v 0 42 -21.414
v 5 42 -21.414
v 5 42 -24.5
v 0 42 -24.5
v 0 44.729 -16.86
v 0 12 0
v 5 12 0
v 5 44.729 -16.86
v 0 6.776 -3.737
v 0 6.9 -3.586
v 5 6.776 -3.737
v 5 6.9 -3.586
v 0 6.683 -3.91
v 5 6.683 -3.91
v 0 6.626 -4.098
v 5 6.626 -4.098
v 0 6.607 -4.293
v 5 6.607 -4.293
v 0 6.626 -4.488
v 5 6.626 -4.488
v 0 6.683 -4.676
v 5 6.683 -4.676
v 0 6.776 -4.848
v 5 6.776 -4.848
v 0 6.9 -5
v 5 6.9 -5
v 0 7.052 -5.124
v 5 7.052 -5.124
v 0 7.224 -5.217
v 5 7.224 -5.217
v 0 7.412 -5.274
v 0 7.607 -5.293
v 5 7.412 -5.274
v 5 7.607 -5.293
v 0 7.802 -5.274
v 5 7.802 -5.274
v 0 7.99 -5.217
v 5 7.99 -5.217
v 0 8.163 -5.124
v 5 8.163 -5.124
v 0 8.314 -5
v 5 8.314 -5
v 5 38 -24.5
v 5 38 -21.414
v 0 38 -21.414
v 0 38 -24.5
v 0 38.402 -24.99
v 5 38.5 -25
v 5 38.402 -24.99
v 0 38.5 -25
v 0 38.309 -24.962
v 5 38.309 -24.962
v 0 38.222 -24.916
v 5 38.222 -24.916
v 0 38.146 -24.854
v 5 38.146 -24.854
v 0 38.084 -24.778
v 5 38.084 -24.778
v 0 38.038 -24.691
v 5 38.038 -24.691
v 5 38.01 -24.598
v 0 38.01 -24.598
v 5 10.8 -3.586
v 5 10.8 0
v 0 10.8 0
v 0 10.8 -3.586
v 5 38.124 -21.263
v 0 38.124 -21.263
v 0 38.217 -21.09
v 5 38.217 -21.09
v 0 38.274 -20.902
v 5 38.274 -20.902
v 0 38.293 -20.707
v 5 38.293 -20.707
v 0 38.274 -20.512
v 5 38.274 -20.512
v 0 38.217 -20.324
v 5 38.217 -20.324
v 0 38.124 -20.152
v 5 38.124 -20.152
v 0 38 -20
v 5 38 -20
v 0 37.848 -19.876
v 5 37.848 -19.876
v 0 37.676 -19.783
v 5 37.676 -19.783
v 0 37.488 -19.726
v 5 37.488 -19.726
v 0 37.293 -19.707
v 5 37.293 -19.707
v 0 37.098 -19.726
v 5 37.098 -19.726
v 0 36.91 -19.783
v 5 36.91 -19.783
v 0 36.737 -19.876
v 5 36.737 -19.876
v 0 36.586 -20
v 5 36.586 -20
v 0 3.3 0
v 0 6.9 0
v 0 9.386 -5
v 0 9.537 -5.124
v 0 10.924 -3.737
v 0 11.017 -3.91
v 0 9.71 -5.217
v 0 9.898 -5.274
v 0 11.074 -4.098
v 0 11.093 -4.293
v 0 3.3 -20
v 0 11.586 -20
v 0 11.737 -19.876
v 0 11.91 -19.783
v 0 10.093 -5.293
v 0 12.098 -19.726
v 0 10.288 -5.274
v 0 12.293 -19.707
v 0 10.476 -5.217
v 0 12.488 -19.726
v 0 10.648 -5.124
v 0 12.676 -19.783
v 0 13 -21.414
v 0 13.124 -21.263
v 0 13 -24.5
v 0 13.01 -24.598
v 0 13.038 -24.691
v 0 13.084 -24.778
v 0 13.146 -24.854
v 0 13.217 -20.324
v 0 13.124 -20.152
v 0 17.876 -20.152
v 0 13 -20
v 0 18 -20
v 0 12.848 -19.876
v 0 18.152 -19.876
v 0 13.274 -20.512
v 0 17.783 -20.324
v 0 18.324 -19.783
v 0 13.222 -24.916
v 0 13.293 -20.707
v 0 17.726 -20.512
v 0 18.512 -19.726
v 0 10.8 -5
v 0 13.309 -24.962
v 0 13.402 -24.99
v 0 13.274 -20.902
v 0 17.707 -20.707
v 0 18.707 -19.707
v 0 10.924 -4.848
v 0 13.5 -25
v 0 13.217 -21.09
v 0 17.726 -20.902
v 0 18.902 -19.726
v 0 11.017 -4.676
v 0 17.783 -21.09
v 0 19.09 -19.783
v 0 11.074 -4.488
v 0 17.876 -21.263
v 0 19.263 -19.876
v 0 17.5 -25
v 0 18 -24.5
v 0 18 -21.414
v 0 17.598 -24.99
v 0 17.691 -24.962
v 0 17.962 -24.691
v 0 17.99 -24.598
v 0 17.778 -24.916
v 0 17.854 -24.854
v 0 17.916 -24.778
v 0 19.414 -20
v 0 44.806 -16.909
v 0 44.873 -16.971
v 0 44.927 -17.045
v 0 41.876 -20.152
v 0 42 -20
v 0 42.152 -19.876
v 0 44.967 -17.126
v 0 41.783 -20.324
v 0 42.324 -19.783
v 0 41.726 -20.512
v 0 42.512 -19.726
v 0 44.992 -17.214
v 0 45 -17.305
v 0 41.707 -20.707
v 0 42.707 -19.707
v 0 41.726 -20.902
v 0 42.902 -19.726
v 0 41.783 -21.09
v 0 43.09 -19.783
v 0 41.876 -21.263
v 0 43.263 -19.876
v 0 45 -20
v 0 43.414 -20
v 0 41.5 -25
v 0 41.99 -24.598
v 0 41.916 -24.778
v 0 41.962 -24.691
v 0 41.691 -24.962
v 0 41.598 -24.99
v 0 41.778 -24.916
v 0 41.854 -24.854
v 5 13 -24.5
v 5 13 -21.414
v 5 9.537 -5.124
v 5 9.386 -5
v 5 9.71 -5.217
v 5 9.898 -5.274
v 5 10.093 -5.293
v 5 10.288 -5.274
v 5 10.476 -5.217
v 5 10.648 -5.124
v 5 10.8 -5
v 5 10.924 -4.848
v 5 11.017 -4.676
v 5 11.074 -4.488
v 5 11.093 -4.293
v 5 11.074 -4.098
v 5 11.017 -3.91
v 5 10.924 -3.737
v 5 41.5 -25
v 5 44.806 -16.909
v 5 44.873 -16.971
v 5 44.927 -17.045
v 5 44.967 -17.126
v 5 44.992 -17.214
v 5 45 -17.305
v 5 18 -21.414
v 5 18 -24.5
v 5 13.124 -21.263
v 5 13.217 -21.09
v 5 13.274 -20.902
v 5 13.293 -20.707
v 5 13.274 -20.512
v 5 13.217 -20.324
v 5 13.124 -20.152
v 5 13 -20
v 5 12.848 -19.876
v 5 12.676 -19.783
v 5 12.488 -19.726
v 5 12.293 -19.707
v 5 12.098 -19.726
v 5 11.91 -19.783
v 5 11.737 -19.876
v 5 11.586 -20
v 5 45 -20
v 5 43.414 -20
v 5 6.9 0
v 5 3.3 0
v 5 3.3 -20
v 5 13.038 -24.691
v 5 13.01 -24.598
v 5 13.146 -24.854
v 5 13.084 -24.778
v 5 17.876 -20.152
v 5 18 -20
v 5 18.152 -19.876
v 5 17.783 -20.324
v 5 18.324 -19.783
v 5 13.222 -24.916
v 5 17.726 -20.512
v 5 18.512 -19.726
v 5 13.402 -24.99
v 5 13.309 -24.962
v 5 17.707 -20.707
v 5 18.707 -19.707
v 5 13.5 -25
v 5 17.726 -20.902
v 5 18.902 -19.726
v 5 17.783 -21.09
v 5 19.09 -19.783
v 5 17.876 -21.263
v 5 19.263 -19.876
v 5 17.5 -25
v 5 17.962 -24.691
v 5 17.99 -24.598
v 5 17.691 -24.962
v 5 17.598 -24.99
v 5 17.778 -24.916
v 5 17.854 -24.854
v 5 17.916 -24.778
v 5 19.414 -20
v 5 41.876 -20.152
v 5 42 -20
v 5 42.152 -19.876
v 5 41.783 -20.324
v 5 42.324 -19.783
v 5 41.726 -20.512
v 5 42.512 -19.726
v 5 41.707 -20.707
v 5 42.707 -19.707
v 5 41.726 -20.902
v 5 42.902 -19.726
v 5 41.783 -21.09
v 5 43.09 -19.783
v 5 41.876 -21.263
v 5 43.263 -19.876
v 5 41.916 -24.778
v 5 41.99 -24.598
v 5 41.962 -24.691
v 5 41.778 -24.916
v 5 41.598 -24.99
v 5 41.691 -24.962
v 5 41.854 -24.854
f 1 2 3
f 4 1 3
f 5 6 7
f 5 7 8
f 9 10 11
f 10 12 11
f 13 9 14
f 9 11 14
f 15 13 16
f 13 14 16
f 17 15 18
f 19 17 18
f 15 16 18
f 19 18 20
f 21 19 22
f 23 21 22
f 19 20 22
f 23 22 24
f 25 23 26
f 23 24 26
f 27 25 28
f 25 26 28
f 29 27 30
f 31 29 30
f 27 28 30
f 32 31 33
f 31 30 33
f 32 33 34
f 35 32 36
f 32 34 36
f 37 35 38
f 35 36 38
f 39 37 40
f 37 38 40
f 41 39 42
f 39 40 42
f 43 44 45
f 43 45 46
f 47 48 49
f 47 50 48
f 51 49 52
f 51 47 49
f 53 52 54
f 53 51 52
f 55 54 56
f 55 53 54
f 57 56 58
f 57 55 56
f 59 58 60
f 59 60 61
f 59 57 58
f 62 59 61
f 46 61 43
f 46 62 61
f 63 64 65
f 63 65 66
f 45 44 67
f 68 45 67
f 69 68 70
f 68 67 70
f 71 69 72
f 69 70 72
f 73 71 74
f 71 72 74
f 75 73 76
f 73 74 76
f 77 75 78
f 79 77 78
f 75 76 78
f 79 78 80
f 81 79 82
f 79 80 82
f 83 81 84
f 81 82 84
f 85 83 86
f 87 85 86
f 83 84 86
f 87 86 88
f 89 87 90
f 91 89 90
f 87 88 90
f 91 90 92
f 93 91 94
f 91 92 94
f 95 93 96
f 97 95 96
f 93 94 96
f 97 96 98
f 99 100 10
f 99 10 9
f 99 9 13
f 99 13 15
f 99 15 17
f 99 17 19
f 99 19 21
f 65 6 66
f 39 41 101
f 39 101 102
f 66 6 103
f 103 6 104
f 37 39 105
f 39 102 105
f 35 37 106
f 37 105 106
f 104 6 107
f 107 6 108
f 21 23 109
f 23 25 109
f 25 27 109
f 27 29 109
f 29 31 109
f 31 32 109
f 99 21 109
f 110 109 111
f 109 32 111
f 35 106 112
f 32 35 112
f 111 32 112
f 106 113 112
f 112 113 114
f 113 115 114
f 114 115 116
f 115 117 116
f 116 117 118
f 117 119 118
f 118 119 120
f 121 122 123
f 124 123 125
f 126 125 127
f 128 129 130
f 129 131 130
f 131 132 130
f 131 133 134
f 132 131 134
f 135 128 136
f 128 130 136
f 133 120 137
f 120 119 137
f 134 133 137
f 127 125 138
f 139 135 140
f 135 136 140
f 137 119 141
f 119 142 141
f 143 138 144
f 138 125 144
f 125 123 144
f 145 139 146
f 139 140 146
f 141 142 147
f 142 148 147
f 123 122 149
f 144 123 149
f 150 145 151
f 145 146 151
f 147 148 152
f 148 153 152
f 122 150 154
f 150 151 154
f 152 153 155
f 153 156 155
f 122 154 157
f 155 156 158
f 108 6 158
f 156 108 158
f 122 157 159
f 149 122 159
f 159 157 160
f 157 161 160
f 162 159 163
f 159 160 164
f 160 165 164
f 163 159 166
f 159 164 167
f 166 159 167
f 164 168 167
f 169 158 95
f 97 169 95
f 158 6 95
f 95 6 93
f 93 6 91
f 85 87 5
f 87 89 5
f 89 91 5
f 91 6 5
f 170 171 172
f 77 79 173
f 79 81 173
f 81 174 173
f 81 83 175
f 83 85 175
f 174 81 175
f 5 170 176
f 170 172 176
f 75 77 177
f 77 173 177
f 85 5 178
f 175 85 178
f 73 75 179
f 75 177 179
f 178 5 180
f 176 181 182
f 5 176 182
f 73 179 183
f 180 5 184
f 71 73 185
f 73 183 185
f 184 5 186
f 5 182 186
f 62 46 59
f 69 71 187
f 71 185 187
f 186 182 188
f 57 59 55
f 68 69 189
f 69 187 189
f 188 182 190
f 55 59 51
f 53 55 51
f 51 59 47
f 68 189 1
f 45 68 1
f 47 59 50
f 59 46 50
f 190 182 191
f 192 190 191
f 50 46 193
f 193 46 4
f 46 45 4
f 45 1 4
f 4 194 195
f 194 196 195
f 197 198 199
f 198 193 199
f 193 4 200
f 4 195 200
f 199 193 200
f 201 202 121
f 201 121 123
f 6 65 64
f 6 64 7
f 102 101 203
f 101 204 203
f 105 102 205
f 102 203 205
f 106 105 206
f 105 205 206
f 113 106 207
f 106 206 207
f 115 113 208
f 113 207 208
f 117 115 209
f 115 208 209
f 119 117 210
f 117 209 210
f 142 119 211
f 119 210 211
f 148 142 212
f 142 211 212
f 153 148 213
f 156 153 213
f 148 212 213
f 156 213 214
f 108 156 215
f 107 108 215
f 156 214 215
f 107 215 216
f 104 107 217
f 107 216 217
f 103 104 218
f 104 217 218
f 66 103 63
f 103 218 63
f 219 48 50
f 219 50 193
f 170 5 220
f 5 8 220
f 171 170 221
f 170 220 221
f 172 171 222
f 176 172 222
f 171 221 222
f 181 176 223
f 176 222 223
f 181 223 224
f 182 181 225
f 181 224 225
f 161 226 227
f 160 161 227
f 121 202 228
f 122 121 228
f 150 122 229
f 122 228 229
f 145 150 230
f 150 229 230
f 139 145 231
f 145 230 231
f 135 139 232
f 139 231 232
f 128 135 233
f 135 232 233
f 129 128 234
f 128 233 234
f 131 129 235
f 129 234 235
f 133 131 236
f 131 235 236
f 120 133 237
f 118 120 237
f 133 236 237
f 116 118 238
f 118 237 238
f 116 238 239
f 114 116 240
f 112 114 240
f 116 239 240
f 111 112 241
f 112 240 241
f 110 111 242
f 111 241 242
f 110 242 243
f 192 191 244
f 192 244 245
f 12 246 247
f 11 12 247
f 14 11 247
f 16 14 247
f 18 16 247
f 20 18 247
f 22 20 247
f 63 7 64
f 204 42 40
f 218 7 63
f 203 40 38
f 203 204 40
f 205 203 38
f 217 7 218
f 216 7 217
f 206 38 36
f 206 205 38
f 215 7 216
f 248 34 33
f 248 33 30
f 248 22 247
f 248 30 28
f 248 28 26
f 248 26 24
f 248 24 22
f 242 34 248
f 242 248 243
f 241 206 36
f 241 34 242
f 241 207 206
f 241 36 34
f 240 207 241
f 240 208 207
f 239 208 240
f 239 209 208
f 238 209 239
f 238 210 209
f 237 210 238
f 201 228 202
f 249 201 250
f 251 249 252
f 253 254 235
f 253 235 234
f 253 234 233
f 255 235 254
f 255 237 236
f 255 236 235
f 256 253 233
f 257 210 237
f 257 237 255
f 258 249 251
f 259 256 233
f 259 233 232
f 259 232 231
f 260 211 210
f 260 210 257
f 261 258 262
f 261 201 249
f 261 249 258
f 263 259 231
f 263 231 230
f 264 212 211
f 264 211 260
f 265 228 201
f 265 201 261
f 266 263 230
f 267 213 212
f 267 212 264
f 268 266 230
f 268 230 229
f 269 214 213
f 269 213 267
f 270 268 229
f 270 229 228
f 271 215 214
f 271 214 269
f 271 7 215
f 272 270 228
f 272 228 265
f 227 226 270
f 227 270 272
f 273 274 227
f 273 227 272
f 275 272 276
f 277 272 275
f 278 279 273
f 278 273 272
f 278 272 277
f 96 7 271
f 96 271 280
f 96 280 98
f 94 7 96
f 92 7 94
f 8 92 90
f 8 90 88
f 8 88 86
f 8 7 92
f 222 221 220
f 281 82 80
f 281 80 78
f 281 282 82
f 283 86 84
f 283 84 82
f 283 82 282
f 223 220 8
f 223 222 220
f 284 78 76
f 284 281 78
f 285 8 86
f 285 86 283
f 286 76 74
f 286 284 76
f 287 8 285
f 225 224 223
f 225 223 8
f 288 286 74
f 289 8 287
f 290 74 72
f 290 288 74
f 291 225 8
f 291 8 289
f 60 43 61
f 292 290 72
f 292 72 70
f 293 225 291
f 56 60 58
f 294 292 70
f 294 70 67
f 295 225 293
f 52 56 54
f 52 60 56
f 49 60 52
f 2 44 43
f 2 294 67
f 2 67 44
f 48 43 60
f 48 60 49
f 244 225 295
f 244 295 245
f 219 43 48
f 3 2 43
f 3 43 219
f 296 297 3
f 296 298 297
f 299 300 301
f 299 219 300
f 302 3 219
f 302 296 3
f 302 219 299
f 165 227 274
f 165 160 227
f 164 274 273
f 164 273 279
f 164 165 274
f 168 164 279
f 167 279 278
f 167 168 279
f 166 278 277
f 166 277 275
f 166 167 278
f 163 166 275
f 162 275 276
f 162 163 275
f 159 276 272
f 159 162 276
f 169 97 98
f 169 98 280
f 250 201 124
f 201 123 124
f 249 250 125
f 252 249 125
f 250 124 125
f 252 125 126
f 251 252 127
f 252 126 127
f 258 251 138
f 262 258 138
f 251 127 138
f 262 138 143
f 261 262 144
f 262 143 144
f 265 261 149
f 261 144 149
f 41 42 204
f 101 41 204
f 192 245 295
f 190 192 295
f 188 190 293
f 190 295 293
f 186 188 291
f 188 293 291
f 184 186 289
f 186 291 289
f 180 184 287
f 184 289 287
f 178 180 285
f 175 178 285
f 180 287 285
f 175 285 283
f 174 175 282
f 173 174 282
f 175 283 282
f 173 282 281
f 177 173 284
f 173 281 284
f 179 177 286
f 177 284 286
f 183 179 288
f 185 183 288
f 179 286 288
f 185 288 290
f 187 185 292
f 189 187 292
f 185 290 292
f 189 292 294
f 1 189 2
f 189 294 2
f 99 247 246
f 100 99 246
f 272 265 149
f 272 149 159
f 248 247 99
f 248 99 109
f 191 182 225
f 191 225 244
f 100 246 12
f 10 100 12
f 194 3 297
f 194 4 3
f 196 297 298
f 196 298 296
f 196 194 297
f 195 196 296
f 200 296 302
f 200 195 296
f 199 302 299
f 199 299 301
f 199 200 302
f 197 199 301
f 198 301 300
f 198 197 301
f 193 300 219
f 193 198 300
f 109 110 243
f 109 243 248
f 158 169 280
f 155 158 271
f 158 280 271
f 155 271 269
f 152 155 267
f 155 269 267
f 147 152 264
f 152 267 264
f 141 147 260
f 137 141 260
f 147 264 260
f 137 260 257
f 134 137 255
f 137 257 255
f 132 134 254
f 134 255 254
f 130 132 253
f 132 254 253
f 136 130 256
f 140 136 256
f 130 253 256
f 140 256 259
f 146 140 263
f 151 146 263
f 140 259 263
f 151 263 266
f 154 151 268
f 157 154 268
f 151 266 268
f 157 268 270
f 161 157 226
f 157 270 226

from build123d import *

# Parameters (mm, degrees)
EXTRUDE_1_DEPTH     = 5
SKETCH_7_W          = 5
SKETCH_7_H          = 10.8
CUT_EXTRUDE_1_DEPTH = 5
SKETCH_8_W          = 15
SKETCH_8_H          = 3.3
CUT_EXTRUDE_2_DEPTH = 5
SKETCH_10_W         = 5
SKETCH_10_H         = 3.6
EXTRUDE_2_DEPTH     = 5
SKETCH_9_R          = 1
CUT_EXTRUDE_3_DEPTH = 5
SKETCH_15_W         = 5
SKETCH_15_H         = 4
SKETCH_15_H_2       = 5
EXTRUDE_6_DEPTH     = 5
SKETCH_11_W         = 5
SKETCH_11_H         = 5
SKETCH_11_H_2       = 4
EXTRUDE_3_DEPTH     = 5
SKETCH_12_R         = 1
CUT_EXTRUDE_4_DEPTH = 5
FILLET_1_R          = 0.5


with BuildPart() as part:
    # 스케치1 → 보스-돌출1 (new body)
    with BuildSketch(Plane(origin=(0, 0, 0), x_dir=(0, 0, -1), z_dir=(1, 0, 0))):
        Polygon((0, 0), (0, 12), (17, 45), (20, 45), (20, 0), align=None)
    extrude(amount=EXTRUDE_1_DEPTH)

    # 스케치7 → 컷-돌출1 (cut)
    with BuildSketch(Plane(origin=(5, 0, 0), x_dir=(0, 0, -1), z_dir=(1, 0, 0))):
        with Locations((2.5, 5.4)):
            Rectangle(SKETCH_7_W, SKETCH_7_H)
    extrude(amount=-CUT_EXTRUDE_1_DEPTH, mode=Mode.SUBTRACT)

    # 스케치8 → 컷-돌출2 (cut)
    with BuildSketch(Plane(origin=(5, 0, 0), x_dir=(0, 0, -1), z_dir=(1, 0, 0))):
        with Locations((12.5, 1.65)):
            Rectangle(SKETCH_8_W, SKETCH_8_H)
    extrude(amount=-CUT_EXTRUDE_2_DEPTH, mode=Mode.SUBTRACT)

    # 스케치10 → 보스-돌출2 (add)
    with BuildSketch(Plane(origin=(5, 0, 0), x_dir=(0, 0, -1), z_dir=(1, 0, 0))):
        with Locations((2.5, 5.1)):
            Rectangle(SKETCH_10_W, SKETCH_10_H)
    extrude(amount=-EXTRUDE_2_DEPTH)

    # 스케치9 → 컷-돌출3 (cut)
    with BuildSketch(Plane(origin=(5, 0, 0), x_dir=(0, 0, -1), z_dir=(1, 0, 0))):
        with Locations((4.292893219, 10.092893219)):
            Circle(SKETCH_9_R)
        with Locations((4.292893219, 7.607106781)):
            Circle(SKETCH_9_R)
    extrude(amount=-CUT_EXTRUDE_3_DEPTH, mode=Mode.SUBTRACT)

    # 스케치15 → 보스-돌출6 (add)
    with BuildSketch(Plane(origin=(5, 0, 0), x_dir=(0, 0, -1), z_dir=(1, 0, 0))):
        with Locations((22.5, 40)):
            Rectangle(SKETCH_15_W, SKETCH_15_H)
        with Locations((22.5, 15.5)):
            Rectangle(SKETCH_15_W, SKETCH_15_H_2)
    extrude(amount=-EXTRUDE_6_DEPTH)

    # 스케치11 → 보스-돌출3 (add)
    with BuildSketch(Plane(origin=(5, 0, 0), x_dir=(0, 0, -1), z_dir=(1, 0, 0))):
        with Locations((22.5, 15.5)):
            Rectangle(SKETCH_11_W, SKETCH_11_H)
        with Locations((22.5, 40)):
            Rectangle(SKETCH_11_W, SKETCH_11_H_2)
    extrude(amount=-EXTRUDE_3_DEPTH)

    # 스케치12 → 컷-돌출4 (cut)
    with BuildSketch(Plane(origin=(5, 0, 0), x_dir=(0, 0, -1), z_dir=(1, 0, 0))):
        with Locations((20.707106781, 18.707106781)):
            Circle(SKETCH_12_R)
        with Locations((20.707106781, 12.292893219)):
            Circle(SKETCH_12_R)
        with Locations((20.707106781, 37.292893219)):
            Circle(SKETCH_12_R)
        with Locations((20.707106781, 42.707106781)):
            Circle(SKETCH_12_R)
    extrude(amount=-CUT_EXTRUDE_4_DEPTH, mode=Mode.SUBTRACT)

    # 필렛1
    fillet_1_edges = [part.edges().sort_by_distance(p)[0] for p in [
        (2.5, 13, -25),
        (2.5, 38, -25),
        (2.5, 18, -25),
        (2.5, 42, -25),
        (2.5, 45, -17),
    ]]
    fillet(fillet_1_edges, radius=FILLET_1_R)


solid = part.part
